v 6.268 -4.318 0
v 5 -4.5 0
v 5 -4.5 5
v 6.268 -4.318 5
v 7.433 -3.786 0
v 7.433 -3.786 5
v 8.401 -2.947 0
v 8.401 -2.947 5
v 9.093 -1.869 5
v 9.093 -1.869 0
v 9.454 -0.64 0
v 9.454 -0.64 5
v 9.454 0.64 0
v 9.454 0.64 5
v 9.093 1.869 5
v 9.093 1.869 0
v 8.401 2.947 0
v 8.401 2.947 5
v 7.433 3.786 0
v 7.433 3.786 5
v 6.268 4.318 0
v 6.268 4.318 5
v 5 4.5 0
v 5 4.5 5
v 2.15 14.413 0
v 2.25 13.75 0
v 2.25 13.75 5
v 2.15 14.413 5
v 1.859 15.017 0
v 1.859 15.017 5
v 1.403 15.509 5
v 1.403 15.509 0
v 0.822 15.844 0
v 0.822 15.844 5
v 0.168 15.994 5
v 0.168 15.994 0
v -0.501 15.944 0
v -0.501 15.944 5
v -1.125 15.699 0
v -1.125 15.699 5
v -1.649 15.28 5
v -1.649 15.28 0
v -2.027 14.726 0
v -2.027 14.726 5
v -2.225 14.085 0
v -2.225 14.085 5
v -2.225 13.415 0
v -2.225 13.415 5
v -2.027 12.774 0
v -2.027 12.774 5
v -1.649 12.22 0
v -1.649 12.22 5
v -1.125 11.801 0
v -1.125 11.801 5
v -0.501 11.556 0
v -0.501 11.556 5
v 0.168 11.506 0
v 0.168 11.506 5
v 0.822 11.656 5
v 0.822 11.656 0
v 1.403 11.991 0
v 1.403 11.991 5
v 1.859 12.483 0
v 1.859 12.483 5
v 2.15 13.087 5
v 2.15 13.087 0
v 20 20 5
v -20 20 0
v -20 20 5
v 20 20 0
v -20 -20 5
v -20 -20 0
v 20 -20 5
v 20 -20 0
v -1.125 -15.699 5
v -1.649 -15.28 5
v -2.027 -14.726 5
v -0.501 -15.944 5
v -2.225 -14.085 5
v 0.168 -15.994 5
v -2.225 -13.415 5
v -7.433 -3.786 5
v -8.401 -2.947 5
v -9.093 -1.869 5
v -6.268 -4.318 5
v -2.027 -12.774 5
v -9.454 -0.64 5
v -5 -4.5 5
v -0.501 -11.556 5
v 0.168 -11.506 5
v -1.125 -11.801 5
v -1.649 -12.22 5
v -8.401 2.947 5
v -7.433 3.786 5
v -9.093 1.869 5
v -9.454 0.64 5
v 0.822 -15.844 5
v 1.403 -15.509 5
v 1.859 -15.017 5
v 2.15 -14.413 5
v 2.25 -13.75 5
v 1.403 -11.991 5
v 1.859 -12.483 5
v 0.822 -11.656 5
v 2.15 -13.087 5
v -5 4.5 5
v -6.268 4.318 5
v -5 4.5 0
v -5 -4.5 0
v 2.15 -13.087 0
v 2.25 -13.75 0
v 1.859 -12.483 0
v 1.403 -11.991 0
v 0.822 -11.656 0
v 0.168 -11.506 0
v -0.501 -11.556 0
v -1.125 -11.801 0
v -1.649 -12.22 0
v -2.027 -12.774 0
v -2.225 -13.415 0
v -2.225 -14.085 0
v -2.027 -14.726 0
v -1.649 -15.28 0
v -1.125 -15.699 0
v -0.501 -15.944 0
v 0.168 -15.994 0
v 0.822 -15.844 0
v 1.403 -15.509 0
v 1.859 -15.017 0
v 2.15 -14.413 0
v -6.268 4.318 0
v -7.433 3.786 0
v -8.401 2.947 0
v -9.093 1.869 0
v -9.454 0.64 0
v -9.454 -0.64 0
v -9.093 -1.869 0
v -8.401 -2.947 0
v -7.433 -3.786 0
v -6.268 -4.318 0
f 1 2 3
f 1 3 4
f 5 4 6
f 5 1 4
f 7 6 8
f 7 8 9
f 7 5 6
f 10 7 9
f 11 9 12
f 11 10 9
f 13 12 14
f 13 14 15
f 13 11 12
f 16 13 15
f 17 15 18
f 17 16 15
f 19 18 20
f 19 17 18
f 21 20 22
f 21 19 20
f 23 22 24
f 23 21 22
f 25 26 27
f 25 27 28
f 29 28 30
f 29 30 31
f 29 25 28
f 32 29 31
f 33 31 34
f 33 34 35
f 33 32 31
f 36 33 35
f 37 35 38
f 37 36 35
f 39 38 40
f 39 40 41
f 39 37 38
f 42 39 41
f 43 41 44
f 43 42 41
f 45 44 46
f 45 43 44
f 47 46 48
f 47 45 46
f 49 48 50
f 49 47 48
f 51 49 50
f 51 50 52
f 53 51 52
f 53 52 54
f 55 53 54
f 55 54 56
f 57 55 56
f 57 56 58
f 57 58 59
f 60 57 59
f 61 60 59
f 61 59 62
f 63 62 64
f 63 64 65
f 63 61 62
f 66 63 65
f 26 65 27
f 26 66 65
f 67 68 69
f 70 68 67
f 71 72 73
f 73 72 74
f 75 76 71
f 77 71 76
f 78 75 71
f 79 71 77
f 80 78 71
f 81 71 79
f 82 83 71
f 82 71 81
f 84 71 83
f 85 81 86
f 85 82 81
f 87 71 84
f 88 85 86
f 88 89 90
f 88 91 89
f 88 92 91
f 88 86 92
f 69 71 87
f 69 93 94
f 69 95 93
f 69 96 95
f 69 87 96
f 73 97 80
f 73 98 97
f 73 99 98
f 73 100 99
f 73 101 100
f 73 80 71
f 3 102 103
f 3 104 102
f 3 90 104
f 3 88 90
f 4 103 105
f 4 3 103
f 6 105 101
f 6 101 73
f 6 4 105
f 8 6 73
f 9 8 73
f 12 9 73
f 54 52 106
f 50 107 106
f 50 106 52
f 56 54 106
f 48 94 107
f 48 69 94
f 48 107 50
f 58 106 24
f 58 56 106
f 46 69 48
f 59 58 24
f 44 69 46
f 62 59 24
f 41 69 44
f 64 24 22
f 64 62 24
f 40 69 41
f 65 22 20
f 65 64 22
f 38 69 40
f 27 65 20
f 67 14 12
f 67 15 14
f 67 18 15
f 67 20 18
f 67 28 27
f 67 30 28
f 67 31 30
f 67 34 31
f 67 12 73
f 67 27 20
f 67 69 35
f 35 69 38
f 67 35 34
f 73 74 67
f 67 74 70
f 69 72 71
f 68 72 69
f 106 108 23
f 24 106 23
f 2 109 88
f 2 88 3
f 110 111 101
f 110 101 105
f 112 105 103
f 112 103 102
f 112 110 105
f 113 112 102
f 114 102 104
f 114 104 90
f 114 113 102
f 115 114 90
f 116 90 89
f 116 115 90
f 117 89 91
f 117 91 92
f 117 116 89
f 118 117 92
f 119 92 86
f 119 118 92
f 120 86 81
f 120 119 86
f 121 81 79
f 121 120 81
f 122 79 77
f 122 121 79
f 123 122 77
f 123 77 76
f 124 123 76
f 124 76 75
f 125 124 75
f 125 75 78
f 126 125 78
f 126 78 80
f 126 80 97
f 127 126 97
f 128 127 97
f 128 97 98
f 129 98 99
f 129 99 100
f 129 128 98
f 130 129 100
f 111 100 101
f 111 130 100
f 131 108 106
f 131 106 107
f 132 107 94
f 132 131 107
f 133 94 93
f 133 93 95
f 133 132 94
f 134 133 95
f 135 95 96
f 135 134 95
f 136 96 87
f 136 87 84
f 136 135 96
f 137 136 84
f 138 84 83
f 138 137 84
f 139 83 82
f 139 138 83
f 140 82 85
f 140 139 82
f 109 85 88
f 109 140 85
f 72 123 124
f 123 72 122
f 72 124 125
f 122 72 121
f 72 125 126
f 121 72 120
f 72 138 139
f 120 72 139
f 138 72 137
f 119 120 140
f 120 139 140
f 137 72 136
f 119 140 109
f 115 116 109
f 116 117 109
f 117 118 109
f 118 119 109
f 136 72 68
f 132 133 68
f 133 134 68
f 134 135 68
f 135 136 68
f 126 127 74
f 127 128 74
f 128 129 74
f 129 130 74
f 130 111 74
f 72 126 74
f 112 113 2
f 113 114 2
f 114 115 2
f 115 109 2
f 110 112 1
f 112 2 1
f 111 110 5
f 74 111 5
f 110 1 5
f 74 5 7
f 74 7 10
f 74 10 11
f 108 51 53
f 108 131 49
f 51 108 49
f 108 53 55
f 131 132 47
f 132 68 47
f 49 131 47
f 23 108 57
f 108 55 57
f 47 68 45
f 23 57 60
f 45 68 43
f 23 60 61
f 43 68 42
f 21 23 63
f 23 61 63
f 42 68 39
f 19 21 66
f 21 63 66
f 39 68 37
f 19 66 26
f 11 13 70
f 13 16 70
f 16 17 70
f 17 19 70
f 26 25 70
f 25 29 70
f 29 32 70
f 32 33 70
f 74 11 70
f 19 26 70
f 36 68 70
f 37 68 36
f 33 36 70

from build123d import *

# Parameters (mm, degrees)
SKETCH_W  = 40
SKETCH_H  = 40
SKETCH_R  = 2.25
PAD_DEPTH = 5


with BuildPart() as part:
    # Sketch → Pad (new body)
    with BuildSketch(Plane.XY):
        Rectangle(SKETCH_W, SKETCH_H)
        with Locations((0, 13.75)):
            Circle(SKETCH_R, mode=Mode.SUBTRACT)
        with Locations((0, -13.75)):
            Circle(SKETCH_R, mode=Mode.SUBTRACT)
        with BuildLine():
            ThreePointArc((-4.999983, 4.5), (-9.499983, 9e-06), (-5, -4.5))
            Line((-5, -4.5), (5, -4.5))
            ThreePointArc((5, -4.5), (9.499983, 9e-06), (4.999983, 4.5))
            Line((-4.999983, 4.5), (4.999983, 4.5))
        make_face(mode=Mode.SUBTRACT)
    extrude(amount=PAD_DEPTH)


solid = part.part
